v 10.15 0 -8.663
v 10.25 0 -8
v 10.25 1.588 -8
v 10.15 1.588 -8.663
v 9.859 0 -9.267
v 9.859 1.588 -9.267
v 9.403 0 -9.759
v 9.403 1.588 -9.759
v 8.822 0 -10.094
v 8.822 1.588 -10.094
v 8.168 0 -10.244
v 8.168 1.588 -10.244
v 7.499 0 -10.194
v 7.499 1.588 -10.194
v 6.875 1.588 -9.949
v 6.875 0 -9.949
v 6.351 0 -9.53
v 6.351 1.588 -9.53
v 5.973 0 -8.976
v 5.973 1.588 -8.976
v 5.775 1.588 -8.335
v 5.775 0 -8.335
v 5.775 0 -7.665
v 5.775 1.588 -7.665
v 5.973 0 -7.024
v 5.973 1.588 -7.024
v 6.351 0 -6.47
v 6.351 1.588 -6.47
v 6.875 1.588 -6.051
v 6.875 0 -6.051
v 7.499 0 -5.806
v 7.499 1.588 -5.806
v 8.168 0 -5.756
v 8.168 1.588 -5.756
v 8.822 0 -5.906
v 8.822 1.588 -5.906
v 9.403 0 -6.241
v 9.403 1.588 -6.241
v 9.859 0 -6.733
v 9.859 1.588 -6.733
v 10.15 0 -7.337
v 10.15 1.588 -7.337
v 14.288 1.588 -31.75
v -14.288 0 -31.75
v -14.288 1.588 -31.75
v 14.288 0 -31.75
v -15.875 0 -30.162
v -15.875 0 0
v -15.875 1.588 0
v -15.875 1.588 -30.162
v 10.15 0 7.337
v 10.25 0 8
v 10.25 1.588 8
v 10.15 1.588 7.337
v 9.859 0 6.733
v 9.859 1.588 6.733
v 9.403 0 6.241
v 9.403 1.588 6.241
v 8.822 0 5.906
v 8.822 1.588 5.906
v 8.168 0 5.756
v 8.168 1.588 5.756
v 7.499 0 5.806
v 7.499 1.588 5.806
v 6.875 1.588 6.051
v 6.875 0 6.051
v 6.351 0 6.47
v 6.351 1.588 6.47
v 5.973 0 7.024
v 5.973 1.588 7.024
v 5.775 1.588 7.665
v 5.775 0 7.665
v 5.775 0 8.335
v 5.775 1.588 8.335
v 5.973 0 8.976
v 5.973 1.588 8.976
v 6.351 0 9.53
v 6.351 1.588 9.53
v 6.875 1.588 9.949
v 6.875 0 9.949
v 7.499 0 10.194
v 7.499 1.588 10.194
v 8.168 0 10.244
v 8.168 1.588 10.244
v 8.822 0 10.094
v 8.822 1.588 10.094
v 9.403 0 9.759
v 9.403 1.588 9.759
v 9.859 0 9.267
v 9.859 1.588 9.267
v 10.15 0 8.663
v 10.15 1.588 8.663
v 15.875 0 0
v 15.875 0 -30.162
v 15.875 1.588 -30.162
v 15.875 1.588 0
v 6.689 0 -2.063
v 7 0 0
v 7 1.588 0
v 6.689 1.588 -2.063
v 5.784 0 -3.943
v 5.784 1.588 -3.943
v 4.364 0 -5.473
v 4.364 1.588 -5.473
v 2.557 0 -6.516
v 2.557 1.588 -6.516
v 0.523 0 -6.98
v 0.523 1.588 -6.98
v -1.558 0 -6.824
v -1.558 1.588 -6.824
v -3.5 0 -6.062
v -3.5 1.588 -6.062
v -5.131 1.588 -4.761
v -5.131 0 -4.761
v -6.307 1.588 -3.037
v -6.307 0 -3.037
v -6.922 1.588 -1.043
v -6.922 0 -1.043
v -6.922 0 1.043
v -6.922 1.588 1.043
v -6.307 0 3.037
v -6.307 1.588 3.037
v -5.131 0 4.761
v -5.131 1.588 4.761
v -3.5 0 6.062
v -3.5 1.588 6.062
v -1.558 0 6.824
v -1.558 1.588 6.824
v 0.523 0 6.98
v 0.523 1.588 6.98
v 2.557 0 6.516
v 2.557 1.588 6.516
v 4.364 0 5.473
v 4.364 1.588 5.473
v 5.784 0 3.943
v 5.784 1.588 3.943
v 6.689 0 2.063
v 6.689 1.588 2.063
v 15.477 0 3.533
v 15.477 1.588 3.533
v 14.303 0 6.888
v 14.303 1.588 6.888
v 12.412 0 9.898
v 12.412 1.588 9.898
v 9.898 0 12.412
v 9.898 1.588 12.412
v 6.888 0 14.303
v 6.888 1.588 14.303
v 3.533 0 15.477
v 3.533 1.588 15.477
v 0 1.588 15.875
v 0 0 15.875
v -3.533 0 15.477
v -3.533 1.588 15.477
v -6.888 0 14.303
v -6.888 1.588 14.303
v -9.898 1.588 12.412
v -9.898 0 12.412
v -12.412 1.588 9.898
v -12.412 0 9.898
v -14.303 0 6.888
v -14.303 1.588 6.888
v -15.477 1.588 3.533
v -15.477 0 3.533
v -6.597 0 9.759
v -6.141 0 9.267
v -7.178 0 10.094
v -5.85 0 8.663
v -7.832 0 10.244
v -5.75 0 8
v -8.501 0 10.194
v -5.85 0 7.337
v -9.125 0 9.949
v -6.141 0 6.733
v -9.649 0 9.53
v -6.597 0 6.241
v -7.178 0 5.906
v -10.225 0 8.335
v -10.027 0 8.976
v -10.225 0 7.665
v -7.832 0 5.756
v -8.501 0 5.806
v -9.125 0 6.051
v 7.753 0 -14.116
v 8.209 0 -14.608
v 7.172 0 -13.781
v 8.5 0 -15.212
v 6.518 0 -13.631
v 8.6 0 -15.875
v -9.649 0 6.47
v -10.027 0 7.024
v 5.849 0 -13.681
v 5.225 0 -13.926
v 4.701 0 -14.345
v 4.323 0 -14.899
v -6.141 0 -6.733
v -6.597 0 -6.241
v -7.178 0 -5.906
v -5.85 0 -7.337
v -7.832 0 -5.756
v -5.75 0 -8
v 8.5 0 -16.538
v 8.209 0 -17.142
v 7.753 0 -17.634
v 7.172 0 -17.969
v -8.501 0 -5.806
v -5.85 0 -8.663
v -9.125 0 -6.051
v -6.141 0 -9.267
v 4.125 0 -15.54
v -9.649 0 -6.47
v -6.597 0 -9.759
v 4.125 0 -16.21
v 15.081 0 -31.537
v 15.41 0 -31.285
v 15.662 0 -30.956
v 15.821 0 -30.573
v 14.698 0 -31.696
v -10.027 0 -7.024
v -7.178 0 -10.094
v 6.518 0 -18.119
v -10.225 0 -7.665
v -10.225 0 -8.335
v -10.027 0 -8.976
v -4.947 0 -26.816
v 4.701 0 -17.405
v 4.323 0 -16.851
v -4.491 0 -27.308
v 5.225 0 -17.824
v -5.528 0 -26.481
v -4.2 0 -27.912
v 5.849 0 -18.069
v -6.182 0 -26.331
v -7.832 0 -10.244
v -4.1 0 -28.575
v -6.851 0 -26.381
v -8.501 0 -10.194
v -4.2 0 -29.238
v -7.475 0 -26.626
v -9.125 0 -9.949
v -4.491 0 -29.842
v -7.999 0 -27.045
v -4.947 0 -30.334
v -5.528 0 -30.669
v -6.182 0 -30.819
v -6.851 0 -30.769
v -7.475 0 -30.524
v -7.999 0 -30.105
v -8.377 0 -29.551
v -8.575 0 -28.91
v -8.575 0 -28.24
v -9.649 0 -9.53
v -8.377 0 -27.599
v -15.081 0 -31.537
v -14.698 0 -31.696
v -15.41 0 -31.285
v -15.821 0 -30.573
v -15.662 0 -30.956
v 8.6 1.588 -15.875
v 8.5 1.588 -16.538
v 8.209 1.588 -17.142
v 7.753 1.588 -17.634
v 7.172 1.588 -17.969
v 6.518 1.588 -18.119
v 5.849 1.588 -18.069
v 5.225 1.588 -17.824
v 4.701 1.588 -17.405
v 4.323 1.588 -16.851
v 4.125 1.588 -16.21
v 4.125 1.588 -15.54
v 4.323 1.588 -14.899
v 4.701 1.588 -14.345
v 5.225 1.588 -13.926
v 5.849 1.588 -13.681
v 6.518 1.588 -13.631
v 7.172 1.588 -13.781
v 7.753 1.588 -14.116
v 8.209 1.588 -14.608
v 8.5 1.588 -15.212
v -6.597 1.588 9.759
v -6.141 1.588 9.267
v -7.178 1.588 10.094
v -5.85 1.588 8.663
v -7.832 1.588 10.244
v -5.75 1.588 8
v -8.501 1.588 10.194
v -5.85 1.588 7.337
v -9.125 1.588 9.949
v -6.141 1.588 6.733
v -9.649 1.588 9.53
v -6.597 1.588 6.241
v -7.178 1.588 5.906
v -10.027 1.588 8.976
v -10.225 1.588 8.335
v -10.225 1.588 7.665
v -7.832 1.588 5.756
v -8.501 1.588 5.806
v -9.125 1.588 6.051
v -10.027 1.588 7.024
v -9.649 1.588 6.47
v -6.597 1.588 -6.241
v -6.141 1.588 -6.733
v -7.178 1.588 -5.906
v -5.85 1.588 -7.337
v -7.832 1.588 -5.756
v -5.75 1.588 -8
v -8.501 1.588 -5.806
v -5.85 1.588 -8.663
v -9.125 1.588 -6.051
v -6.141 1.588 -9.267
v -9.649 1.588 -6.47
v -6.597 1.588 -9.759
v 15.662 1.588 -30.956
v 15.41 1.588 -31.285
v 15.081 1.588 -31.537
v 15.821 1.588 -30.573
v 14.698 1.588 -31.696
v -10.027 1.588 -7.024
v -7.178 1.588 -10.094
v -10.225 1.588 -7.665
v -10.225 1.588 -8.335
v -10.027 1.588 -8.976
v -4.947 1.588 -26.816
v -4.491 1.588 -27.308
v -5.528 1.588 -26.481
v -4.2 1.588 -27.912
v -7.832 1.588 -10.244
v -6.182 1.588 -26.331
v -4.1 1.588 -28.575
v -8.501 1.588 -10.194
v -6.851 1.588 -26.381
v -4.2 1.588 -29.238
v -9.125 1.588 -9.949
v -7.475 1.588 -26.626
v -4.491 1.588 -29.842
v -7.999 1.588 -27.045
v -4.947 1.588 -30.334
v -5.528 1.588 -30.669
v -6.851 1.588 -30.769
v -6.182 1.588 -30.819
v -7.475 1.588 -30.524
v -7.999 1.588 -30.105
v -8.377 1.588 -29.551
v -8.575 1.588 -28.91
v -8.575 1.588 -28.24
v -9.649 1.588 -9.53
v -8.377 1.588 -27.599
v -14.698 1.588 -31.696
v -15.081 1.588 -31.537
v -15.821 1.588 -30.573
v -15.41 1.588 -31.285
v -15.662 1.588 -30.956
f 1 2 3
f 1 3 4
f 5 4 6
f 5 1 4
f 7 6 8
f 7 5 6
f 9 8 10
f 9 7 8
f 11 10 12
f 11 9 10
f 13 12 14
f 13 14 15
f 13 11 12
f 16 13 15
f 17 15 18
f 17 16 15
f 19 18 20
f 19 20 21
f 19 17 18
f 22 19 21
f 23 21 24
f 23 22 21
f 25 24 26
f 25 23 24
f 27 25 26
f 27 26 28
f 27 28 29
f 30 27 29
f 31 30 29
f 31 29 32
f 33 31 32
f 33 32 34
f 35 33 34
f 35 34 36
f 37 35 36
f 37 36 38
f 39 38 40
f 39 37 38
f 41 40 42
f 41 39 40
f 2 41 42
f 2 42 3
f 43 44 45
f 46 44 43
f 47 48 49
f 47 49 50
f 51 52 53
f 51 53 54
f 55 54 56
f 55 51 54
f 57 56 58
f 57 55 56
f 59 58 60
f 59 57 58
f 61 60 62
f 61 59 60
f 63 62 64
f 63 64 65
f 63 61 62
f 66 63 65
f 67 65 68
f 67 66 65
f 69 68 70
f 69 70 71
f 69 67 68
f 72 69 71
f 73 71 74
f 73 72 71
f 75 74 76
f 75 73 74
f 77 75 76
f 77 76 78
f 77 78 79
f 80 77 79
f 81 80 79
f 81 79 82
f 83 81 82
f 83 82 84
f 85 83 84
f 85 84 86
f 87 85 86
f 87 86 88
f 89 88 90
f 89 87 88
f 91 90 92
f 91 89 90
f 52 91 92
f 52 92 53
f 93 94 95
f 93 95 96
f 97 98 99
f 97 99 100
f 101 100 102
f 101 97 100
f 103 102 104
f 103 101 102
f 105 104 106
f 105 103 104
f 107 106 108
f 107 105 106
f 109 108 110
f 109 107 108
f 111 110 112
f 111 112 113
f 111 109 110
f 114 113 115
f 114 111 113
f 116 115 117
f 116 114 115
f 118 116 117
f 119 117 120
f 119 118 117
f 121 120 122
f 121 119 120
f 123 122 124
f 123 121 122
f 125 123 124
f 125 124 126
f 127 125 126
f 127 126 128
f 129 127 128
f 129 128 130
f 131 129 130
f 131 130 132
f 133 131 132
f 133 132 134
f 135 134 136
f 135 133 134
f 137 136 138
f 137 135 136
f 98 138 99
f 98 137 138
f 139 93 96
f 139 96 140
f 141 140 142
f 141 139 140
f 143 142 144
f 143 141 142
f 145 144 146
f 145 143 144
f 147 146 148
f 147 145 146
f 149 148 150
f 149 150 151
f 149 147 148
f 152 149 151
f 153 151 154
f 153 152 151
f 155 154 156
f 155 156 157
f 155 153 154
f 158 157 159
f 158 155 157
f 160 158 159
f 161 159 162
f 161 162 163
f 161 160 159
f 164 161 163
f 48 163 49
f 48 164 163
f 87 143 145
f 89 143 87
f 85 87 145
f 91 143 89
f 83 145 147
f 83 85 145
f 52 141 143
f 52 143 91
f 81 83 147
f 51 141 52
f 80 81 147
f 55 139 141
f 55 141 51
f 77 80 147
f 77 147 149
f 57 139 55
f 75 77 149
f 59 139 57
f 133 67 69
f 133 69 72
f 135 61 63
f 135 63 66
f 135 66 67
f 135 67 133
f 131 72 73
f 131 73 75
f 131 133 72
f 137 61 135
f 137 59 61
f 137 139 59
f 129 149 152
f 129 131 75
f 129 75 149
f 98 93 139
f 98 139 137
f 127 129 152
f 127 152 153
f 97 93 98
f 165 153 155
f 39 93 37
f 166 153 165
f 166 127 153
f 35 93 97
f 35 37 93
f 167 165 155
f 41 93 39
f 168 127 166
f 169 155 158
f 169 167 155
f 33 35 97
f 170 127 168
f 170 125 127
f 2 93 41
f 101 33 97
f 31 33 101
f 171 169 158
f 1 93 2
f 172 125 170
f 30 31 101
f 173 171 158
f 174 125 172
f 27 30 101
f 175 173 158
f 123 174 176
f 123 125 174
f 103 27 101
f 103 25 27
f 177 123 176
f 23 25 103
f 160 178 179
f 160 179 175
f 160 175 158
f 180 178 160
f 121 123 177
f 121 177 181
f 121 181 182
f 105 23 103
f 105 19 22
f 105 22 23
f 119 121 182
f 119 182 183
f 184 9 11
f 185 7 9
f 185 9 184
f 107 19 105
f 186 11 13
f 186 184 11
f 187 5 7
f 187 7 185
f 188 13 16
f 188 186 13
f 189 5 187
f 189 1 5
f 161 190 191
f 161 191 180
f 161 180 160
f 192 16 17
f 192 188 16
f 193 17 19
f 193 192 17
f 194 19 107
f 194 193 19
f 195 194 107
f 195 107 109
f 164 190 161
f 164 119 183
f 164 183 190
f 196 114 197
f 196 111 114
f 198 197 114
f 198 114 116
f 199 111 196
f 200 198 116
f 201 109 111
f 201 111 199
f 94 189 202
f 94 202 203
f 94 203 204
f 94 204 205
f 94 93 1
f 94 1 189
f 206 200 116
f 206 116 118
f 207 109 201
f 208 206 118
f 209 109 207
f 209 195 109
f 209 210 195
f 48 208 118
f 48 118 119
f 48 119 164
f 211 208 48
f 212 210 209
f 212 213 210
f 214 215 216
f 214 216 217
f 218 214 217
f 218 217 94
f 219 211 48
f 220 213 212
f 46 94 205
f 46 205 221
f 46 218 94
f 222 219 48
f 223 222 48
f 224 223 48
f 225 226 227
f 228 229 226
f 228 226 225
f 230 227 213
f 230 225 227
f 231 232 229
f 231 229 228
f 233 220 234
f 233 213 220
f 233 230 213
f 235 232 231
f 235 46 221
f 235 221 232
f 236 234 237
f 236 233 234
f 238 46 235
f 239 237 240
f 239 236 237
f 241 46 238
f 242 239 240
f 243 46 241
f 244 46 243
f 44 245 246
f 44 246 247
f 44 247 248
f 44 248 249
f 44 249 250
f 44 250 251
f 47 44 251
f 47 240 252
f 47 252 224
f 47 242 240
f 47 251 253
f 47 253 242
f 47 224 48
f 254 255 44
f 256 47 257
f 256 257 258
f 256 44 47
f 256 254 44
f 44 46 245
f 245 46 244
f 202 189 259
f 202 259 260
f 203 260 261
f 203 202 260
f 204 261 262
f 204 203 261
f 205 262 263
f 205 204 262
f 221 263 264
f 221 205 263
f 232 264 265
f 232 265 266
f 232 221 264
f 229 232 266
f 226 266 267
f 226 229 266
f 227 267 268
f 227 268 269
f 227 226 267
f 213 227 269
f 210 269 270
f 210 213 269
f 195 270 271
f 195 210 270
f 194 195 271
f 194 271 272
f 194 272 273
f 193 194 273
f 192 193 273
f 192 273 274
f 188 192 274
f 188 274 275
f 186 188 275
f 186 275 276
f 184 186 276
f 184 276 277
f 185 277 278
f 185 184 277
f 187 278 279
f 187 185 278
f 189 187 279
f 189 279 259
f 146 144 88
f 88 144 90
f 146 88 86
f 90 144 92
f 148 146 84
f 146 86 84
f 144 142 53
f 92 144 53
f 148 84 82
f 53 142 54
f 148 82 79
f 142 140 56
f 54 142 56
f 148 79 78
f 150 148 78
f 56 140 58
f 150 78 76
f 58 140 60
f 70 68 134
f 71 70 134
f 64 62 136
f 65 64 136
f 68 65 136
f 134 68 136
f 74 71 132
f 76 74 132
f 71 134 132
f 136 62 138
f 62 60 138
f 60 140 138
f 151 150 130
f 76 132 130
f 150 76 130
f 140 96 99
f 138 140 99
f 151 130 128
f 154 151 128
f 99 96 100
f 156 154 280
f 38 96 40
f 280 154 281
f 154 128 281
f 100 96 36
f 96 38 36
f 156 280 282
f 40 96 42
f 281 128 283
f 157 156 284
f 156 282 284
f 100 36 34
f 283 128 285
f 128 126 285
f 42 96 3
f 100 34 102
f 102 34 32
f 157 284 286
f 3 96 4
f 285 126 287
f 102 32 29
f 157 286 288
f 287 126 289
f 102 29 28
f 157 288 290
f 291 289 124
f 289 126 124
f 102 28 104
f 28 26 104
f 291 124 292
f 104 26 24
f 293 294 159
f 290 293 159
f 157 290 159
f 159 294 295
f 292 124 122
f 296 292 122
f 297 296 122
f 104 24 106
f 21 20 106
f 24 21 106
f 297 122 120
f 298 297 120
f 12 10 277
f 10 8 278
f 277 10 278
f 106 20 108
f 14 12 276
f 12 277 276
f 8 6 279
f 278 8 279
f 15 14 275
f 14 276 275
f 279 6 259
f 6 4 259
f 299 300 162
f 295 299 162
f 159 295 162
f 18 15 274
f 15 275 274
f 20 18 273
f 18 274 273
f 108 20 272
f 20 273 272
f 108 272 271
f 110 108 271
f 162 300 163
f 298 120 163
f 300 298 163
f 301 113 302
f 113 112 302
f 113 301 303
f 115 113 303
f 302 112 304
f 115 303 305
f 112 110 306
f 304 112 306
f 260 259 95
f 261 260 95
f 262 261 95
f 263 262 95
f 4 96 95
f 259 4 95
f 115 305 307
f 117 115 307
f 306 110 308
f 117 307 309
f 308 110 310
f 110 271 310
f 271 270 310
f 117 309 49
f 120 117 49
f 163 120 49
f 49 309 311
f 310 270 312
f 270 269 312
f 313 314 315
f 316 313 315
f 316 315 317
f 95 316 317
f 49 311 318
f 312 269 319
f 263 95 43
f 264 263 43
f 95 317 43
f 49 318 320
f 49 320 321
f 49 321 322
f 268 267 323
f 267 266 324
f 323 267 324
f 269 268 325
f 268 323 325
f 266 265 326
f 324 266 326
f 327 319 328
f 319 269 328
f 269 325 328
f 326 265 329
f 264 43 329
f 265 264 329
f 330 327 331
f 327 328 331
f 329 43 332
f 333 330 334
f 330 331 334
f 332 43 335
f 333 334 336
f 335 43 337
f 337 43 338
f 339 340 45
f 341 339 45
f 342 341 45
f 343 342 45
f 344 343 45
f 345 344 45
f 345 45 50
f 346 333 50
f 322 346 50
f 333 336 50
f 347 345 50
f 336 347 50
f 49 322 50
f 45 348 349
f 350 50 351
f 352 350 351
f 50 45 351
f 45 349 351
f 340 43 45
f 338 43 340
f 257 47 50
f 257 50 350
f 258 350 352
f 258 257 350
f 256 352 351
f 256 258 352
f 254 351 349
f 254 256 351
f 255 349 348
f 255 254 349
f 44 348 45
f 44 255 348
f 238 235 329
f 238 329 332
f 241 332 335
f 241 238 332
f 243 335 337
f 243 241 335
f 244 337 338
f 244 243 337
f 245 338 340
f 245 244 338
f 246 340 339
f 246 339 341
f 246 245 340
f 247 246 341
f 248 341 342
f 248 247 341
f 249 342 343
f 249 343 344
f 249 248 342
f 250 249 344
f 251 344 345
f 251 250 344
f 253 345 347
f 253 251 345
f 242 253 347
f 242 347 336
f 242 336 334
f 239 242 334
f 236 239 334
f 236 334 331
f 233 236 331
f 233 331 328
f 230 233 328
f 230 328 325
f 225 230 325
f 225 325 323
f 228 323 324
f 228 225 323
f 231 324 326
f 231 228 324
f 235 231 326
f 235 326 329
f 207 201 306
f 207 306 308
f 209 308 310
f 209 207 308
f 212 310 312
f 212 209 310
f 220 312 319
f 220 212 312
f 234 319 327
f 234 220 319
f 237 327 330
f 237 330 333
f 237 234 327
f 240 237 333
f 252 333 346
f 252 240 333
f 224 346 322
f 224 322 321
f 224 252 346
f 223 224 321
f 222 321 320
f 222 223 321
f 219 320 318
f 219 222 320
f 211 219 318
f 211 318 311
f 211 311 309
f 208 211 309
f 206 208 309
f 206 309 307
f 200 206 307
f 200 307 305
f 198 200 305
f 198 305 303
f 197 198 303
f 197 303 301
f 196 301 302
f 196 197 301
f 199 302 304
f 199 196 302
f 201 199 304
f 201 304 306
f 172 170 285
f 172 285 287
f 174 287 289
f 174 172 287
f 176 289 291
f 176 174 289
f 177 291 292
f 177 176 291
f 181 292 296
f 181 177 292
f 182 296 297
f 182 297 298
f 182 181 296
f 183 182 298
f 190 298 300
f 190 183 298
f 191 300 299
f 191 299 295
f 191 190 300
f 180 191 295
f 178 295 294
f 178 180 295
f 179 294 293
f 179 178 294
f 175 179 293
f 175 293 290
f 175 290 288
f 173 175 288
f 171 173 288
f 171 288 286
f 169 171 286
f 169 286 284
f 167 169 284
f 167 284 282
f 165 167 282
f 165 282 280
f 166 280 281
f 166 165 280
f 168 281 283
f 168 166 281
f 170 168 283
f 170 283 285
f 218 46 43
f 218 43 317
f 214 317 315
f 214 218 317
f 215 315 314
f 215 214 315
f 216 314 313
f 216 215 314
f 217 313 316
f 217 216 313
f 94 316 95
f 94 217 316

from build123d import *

# Parameters (mm, degrees)
SKETCH1_R           = 7
SKETCH1_R_2         = 2.25
BOSS_EXTRUDE1_DEPTH = 1.5875


with BuildPart() as part:
    # Sketch1 → Boss-Extrude1 (new body)
    with BuildSketch(Plane(origin=(0, 0, 0), x_dir=(1, 0, 0), z_dir=(0, 1, 0))):
        with BuildLine():
            Line((-15.875, 0), (-15.875, 30.1625))
            ThreePointArc((-15.875, 30.1625), (-15.410032015, 31.285032015), (-14.2875, 31.75))
            Line((-14.2875, 31.75), (14.2875, 31.75))
            ThreePointArc((14.2875, 31.75), (15.410032015, 31.285032015), (15.875, 30.1625))
            Line((15.875, 30.1625), (15.875, 0))
            ThreePointArc((15.875, 0), (0, -15.875), (-15.875, 0))
        make_face()
        Circle(SKETCH1_R, mode=Mode.SUBTRACT)
        with Locations((-8, 8)):
            Circle(SKETCH1_R_2, mode=Mode.SUBTRACT)
        with Locations((8, 8)):
            Circle(SKETCH1_R_2, mode=Mode.SUBTRACT)
        with Locations((8, -8)):
            Circle(SKETCH1_R_2, mode=Mode.SUBTRACT)
        with Locations((-8, -8)):
            Circle(SKETCH1_R_2, mode=Mode.SUBTRACT)
        with Locations((-6.35, 28.575)):
            Circle(SKETCH1_R_2, mode=Mode.SUBTRACT)
        with Locations((6.35, 15.875)):
            Circle(SKETCH1_R_2, mode=Mode.SUBTRACT)
    extrude(amount=BOSS_EXTRUDE1_DEPTH)


solid = part.part
